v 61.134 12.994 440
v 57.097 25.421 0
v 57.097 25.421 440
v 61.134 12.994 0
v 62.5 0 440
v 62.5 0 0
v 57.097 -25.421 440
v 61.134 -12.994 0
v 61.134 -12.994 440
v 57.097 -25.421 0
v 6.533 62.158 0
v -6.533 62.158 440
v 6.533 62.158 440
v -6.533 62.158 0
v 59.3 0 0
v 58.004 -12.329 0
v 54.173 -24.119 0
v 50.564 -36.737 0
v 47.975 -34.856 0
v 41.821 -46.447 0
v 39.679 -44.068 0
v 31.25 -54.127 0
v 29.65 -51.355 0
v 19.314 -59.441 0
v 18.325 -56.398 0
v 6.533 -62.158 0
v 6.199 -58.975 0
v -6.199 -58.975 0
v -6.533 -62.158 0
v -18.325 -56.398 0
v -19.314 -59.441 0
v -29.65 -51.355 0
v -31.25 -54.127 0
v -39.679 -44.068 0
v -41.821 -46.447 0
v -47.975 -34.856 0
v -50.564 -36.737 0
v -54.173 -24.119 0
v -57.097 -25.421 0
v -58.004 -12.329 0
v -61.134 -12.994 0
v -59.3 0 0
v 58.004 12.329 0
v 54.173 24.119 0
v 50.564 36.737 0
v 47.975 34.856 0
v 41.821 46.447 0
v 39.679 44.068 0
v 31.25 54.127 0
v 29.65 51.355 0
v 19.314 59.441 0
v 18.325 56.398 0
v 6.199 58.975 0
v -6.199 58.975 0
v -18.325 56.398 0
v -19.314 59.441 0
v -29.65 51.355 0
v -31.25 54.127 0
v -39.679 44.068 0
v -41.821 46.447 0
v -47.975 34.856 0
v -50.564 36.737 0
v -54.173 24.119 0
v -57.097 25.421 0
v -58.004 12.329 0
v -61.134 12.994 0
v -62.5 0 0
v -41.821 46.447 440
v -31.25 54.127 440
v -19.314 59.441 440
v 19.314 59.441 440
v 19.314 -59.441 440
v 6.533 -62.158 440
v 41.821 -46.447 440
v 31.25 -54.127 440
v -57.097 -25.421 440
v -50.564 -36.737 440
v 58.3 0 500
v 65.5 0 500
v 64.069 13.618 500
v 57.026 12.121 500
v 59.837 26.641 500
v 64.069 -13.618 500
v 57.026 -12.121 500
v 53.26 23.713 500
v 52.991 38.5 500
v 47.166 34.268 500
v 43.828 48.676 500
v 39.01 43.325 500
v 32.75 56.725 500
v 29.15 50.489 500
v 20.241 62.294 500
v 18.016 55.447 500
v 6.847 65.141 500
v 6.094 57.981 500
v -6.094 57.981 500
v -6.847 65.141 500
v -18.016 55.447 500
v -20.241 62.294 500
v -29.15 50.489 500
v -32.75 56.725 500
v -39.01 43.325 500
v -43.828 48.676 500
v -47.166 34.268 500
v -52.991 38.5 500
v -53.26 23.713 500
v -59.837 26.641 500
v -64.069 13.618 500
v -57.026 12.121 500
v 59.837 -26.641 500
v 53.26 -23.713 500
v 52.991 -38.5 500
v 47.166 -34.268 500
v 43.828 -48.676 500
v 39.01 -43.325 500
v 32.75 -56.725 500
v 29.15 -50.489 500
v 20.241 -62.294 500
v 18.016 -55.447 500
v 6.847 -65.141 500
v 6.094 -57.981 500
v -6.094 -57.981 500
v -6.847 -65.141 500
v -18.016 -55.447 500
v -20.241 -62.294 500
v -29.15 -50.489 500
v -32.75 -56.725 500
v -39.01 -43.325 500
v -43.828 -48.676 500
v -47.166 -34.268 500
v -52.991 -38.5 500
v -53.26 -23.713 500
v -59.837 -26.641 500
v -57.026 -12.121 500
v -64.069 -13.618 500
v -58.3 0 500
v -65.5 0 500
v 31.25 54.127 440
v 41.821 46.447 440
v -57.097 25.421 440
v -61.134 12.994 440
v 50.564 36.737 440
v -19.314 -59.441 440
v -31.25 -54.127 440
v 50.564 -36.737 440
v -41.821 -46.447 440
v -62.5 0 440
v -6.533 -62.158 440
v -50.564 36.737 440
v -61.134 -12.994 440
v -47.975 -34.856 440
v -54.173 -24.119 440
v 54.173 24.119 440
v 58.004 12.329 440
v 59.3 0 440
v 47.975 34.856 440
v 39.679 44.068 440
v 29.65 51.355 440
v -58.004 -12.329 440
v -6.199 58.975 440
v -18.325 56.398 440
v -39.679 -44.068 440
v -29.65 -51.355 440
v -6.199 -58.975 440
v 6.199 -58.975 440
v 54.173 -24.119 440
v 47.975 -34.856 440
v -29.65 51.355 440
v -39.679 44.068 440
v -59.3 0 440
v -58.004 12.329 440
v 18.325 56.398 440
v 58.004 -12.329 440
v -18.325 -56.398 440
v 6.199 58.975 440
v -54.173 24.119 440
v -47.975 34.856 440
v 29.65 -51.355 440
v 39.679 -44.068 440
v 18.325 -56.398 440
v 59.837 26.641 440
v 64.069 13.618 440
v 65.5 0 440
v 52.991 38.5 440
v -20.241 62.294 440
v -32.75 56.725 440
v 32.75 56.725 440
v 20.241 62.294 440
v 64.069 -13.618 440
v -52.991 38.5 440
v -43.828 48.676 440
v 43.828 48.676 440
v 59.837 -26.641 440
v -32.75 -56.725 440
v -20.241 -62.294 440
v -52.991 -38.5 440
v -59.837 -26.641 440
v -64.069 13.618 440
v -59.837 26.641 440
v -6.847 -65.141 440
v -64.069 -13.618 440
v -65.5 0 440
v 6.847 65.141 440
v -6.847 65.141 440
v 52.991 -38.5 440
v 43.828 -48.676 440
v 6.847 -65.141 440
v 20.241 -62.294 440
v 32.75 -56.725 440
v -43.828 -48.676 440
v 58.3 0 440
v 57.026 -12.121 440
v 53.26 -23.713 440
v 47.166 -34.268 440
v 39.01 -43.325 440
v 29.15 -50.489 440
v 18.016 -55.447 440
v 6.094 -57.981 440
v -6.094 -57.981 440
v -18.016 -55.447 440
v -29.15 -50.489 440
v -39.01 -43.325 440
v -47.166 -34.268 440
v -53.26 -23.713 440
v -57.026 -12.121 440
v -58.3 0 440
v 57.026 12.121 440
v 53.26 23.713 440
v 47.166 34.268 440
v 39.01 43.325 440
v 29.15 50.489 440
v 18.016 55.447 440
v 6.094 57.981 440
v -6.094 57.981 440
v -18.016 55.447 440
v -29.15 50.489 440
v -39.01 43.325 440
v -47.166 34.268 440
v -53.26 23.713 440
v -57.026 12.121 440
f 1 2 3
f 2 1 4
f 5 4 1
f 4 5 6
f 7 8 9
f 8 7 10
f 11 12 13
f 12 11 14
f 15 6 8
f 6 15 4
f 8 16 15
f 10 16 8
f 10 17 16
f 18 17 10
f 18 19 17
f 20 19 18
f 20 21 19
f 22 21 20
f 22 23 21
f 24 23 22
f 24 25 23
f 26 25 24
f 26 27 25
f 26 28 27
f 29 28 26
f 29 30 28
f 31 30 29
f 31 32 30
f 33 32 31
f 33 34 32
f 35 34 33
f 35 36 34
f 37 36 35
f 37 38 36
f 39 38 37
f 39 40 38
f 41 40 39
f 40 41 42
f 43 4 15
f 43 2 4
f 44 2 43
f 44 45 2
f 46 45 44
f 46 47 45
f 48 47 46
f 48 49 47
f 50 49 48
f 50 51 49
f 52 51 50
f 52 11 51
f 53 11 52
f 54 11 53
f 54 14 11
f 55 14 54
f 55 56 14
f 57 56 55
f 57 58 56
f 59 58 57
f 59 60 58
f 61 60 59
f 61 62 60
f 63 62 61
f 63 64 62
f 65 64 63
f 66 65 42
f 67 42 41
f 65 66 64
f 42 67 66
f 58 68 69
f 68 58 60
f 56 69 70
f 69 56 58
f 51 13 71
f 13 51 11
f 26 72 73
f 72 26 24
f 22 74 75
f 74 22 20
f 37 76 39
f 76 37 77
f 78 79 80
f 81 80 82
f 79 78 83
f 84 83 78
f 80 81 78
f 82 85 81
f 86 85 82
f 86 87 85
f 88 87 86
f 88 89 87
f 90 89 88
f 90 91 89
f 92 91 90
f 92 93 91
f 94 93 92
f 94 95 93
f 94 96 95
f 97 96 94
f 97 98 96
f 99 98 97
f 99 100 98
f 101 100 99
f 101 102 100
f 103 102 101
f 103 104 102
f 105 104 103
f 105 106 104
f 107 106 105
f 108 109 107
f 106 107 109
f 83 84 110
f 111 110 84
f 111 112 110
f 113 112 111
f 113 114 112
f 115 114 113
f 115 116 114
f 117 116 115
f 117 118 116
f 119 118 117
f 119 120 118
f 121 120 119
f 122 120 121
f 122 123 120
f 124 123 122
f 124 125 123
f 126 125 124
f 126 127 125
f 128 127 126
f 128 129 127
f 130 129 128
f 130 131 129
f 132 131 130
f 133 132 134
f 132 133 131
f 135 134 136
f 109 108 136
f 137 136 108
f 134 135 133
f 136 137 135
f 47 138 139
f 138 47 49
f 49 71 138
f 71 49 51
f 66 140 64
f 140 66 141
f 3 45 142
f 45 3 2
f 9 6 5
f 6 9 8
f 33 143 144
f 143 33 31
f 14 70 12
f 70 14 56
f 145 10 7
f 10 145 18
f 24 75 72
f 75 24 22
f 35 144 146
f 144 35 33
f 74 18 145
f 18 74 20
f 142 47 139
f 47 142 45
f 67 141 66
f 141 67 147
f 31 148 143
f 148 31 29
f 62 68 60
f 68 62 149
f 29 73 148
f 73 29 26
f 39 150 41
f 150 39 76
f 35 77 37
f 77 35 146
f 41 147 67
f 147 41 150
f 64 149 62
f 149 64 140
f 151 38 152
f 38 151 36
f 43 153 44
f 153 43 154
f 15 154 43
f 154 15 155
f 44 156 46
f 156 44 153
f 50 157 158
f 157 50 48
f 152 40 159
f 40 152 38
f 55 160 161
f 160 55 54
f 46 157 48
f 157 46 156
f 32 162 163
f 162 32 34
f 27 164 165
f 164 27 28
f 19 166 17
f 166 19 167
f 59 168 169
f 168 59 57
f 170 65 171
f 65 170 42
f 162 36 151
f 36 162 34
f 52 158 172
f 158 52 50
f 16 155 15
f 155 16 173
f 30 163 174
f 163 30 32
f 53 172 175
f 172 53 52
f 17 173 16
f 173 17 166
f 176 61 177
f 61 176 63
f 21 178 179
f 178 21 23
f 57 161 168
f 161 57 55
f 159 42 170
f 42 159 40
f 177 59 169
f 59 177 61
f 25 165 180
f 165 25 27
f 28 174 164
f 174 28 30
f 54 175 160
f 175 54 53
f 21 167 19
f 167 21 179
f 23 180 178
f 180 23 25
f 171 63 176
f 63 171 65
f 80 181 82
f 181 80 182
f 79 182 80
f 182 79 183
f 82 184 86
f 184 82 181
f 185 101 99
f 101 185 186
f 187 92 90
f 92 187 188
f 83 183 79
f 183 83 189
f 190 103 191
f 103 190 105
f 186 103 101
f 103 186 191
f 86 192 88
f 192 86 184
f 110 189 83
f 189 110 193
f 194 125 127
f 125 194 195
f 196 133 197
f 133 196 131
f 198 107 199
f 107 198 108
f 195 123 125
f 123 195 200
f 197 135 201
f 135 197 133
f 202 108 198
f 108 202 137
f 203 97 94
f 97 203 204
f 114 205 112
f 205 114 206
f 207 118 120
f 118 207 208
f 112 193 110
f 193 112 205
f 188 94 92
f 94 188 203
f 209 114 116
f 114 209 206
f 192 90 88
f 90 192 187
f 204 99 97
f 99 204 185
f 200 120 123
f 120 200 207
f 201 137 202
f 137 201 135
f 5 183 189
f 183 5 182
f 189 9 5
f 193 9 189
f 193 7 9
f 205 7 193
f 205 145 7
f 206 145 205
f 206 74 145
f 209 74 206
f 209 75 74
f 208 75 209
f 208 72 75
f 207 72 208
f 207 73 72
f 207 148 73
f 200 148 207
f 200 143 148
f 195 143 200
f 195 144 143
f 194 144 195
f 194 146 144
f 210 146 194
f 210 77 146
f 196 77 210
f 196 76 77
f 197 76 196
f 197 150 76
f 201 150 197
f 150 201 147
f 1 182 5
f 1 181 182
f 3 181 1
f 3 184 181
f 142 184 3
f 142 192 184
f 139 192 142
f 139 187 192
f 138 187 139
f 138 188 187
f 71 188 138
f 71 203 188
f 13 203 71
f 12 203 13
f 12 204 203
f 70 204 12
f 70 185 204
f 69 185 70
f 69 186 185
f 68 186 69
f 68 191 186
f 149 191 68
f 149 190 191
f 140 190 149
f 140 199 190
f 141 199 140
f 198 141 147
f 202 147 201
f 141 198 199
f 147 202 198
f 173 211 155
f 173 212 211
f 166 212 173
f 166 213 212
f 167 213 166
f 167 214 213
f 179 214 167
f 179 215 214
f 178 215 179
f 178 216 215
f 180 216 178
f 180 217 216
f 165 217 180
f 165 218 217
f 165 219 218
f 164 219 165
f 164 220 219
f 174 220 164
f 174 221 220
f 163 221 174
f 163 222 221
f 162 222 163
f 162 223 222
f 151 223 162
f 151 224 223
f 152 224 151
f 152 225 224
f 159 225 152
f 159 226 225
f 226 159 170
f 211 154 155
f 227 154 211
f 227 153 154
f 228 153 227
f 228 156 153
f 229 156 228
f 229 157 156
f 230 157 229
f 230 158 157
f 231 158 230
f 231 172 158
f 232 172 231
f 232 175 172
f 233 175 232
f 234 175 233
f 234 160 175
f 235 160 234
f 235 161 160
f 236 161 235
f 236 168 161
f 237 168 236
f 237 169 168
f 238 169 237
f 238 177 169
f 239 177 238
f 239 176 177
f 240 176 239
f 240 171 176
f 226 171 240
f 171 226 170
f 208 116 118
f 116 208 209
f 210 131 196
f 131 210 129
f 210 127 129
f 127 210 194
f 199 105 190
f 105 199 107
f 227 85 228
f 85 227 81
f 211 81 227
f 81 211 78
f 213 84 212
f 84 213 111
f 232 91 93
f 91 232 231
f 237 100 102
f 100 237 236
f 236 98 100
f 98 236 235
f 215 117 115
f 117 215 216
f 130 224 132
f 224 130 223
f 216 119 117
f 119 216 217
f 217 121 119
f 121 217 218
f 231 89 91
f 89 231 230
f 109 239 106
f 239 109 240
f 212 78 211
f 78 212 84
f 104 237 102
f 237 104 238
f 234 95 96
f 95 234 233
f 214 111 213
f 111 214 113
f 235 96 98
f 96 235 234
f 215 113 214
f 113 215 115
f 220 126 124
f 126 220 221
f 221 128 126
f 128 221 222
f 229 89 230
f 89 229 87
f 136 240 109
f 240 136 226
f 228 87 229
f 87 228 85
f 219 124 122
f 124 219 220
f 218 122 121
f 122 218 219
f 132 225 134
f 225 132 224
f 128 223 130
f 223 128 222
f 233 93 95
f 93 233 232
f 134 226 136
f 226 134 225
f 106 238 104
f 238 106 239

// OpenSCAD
// Parameters
length_mm = 500; //[250:1000:1]
ht125_outer_diameter = 125; //[62.5:250:0.5]
wall_thickness = 3.2; //[1.6:6.4:0.1]
socket_length = 60; //[30:120:1]
socket_wall_extra = 2.0; //[1.0:6.0:0.1]
socket_od_extra = 6.0; //[2.0:15.0:0.5]
overlap = 1.0; //[0.5:2.0:0.1]

// Module for the HT Pipe with detailed geometry
module ht_pipe() {
  color([0.85, 0.85, 0.8]) { // PVC color
    difference() {
      // Outer pipe
      cylinder(h=length_mm, r=ht125_outer_diameter/2, center=false);
      
      // Inner void of the pipe
      translate([0, 0, -overlap])
        cylinder(h=length_mm + overlap*2, r=ht125_outer_diameter/2 - wall_thickness, center=false);
    }
    
    // Socket at one end
    translate([0, 0, length_mm - socket_length]) {
      difference() {
        // Outer socket
        cylinder(h=socket_length, r=ht125_outer_diameter/2 + socket_od_extra/2, center=false);
        
        // Inner void of the socket
        translate([0, 0, -overlap])
          cylinder(h=socket_length + overlap*2, r=ht125_outer_diameter/2 - wall_thickness - overlap, center=false);
      }
    }
  }
}

// Assembly module
module assembly() {
  ht_pipe();
}

// Call the assembly
assembly();
